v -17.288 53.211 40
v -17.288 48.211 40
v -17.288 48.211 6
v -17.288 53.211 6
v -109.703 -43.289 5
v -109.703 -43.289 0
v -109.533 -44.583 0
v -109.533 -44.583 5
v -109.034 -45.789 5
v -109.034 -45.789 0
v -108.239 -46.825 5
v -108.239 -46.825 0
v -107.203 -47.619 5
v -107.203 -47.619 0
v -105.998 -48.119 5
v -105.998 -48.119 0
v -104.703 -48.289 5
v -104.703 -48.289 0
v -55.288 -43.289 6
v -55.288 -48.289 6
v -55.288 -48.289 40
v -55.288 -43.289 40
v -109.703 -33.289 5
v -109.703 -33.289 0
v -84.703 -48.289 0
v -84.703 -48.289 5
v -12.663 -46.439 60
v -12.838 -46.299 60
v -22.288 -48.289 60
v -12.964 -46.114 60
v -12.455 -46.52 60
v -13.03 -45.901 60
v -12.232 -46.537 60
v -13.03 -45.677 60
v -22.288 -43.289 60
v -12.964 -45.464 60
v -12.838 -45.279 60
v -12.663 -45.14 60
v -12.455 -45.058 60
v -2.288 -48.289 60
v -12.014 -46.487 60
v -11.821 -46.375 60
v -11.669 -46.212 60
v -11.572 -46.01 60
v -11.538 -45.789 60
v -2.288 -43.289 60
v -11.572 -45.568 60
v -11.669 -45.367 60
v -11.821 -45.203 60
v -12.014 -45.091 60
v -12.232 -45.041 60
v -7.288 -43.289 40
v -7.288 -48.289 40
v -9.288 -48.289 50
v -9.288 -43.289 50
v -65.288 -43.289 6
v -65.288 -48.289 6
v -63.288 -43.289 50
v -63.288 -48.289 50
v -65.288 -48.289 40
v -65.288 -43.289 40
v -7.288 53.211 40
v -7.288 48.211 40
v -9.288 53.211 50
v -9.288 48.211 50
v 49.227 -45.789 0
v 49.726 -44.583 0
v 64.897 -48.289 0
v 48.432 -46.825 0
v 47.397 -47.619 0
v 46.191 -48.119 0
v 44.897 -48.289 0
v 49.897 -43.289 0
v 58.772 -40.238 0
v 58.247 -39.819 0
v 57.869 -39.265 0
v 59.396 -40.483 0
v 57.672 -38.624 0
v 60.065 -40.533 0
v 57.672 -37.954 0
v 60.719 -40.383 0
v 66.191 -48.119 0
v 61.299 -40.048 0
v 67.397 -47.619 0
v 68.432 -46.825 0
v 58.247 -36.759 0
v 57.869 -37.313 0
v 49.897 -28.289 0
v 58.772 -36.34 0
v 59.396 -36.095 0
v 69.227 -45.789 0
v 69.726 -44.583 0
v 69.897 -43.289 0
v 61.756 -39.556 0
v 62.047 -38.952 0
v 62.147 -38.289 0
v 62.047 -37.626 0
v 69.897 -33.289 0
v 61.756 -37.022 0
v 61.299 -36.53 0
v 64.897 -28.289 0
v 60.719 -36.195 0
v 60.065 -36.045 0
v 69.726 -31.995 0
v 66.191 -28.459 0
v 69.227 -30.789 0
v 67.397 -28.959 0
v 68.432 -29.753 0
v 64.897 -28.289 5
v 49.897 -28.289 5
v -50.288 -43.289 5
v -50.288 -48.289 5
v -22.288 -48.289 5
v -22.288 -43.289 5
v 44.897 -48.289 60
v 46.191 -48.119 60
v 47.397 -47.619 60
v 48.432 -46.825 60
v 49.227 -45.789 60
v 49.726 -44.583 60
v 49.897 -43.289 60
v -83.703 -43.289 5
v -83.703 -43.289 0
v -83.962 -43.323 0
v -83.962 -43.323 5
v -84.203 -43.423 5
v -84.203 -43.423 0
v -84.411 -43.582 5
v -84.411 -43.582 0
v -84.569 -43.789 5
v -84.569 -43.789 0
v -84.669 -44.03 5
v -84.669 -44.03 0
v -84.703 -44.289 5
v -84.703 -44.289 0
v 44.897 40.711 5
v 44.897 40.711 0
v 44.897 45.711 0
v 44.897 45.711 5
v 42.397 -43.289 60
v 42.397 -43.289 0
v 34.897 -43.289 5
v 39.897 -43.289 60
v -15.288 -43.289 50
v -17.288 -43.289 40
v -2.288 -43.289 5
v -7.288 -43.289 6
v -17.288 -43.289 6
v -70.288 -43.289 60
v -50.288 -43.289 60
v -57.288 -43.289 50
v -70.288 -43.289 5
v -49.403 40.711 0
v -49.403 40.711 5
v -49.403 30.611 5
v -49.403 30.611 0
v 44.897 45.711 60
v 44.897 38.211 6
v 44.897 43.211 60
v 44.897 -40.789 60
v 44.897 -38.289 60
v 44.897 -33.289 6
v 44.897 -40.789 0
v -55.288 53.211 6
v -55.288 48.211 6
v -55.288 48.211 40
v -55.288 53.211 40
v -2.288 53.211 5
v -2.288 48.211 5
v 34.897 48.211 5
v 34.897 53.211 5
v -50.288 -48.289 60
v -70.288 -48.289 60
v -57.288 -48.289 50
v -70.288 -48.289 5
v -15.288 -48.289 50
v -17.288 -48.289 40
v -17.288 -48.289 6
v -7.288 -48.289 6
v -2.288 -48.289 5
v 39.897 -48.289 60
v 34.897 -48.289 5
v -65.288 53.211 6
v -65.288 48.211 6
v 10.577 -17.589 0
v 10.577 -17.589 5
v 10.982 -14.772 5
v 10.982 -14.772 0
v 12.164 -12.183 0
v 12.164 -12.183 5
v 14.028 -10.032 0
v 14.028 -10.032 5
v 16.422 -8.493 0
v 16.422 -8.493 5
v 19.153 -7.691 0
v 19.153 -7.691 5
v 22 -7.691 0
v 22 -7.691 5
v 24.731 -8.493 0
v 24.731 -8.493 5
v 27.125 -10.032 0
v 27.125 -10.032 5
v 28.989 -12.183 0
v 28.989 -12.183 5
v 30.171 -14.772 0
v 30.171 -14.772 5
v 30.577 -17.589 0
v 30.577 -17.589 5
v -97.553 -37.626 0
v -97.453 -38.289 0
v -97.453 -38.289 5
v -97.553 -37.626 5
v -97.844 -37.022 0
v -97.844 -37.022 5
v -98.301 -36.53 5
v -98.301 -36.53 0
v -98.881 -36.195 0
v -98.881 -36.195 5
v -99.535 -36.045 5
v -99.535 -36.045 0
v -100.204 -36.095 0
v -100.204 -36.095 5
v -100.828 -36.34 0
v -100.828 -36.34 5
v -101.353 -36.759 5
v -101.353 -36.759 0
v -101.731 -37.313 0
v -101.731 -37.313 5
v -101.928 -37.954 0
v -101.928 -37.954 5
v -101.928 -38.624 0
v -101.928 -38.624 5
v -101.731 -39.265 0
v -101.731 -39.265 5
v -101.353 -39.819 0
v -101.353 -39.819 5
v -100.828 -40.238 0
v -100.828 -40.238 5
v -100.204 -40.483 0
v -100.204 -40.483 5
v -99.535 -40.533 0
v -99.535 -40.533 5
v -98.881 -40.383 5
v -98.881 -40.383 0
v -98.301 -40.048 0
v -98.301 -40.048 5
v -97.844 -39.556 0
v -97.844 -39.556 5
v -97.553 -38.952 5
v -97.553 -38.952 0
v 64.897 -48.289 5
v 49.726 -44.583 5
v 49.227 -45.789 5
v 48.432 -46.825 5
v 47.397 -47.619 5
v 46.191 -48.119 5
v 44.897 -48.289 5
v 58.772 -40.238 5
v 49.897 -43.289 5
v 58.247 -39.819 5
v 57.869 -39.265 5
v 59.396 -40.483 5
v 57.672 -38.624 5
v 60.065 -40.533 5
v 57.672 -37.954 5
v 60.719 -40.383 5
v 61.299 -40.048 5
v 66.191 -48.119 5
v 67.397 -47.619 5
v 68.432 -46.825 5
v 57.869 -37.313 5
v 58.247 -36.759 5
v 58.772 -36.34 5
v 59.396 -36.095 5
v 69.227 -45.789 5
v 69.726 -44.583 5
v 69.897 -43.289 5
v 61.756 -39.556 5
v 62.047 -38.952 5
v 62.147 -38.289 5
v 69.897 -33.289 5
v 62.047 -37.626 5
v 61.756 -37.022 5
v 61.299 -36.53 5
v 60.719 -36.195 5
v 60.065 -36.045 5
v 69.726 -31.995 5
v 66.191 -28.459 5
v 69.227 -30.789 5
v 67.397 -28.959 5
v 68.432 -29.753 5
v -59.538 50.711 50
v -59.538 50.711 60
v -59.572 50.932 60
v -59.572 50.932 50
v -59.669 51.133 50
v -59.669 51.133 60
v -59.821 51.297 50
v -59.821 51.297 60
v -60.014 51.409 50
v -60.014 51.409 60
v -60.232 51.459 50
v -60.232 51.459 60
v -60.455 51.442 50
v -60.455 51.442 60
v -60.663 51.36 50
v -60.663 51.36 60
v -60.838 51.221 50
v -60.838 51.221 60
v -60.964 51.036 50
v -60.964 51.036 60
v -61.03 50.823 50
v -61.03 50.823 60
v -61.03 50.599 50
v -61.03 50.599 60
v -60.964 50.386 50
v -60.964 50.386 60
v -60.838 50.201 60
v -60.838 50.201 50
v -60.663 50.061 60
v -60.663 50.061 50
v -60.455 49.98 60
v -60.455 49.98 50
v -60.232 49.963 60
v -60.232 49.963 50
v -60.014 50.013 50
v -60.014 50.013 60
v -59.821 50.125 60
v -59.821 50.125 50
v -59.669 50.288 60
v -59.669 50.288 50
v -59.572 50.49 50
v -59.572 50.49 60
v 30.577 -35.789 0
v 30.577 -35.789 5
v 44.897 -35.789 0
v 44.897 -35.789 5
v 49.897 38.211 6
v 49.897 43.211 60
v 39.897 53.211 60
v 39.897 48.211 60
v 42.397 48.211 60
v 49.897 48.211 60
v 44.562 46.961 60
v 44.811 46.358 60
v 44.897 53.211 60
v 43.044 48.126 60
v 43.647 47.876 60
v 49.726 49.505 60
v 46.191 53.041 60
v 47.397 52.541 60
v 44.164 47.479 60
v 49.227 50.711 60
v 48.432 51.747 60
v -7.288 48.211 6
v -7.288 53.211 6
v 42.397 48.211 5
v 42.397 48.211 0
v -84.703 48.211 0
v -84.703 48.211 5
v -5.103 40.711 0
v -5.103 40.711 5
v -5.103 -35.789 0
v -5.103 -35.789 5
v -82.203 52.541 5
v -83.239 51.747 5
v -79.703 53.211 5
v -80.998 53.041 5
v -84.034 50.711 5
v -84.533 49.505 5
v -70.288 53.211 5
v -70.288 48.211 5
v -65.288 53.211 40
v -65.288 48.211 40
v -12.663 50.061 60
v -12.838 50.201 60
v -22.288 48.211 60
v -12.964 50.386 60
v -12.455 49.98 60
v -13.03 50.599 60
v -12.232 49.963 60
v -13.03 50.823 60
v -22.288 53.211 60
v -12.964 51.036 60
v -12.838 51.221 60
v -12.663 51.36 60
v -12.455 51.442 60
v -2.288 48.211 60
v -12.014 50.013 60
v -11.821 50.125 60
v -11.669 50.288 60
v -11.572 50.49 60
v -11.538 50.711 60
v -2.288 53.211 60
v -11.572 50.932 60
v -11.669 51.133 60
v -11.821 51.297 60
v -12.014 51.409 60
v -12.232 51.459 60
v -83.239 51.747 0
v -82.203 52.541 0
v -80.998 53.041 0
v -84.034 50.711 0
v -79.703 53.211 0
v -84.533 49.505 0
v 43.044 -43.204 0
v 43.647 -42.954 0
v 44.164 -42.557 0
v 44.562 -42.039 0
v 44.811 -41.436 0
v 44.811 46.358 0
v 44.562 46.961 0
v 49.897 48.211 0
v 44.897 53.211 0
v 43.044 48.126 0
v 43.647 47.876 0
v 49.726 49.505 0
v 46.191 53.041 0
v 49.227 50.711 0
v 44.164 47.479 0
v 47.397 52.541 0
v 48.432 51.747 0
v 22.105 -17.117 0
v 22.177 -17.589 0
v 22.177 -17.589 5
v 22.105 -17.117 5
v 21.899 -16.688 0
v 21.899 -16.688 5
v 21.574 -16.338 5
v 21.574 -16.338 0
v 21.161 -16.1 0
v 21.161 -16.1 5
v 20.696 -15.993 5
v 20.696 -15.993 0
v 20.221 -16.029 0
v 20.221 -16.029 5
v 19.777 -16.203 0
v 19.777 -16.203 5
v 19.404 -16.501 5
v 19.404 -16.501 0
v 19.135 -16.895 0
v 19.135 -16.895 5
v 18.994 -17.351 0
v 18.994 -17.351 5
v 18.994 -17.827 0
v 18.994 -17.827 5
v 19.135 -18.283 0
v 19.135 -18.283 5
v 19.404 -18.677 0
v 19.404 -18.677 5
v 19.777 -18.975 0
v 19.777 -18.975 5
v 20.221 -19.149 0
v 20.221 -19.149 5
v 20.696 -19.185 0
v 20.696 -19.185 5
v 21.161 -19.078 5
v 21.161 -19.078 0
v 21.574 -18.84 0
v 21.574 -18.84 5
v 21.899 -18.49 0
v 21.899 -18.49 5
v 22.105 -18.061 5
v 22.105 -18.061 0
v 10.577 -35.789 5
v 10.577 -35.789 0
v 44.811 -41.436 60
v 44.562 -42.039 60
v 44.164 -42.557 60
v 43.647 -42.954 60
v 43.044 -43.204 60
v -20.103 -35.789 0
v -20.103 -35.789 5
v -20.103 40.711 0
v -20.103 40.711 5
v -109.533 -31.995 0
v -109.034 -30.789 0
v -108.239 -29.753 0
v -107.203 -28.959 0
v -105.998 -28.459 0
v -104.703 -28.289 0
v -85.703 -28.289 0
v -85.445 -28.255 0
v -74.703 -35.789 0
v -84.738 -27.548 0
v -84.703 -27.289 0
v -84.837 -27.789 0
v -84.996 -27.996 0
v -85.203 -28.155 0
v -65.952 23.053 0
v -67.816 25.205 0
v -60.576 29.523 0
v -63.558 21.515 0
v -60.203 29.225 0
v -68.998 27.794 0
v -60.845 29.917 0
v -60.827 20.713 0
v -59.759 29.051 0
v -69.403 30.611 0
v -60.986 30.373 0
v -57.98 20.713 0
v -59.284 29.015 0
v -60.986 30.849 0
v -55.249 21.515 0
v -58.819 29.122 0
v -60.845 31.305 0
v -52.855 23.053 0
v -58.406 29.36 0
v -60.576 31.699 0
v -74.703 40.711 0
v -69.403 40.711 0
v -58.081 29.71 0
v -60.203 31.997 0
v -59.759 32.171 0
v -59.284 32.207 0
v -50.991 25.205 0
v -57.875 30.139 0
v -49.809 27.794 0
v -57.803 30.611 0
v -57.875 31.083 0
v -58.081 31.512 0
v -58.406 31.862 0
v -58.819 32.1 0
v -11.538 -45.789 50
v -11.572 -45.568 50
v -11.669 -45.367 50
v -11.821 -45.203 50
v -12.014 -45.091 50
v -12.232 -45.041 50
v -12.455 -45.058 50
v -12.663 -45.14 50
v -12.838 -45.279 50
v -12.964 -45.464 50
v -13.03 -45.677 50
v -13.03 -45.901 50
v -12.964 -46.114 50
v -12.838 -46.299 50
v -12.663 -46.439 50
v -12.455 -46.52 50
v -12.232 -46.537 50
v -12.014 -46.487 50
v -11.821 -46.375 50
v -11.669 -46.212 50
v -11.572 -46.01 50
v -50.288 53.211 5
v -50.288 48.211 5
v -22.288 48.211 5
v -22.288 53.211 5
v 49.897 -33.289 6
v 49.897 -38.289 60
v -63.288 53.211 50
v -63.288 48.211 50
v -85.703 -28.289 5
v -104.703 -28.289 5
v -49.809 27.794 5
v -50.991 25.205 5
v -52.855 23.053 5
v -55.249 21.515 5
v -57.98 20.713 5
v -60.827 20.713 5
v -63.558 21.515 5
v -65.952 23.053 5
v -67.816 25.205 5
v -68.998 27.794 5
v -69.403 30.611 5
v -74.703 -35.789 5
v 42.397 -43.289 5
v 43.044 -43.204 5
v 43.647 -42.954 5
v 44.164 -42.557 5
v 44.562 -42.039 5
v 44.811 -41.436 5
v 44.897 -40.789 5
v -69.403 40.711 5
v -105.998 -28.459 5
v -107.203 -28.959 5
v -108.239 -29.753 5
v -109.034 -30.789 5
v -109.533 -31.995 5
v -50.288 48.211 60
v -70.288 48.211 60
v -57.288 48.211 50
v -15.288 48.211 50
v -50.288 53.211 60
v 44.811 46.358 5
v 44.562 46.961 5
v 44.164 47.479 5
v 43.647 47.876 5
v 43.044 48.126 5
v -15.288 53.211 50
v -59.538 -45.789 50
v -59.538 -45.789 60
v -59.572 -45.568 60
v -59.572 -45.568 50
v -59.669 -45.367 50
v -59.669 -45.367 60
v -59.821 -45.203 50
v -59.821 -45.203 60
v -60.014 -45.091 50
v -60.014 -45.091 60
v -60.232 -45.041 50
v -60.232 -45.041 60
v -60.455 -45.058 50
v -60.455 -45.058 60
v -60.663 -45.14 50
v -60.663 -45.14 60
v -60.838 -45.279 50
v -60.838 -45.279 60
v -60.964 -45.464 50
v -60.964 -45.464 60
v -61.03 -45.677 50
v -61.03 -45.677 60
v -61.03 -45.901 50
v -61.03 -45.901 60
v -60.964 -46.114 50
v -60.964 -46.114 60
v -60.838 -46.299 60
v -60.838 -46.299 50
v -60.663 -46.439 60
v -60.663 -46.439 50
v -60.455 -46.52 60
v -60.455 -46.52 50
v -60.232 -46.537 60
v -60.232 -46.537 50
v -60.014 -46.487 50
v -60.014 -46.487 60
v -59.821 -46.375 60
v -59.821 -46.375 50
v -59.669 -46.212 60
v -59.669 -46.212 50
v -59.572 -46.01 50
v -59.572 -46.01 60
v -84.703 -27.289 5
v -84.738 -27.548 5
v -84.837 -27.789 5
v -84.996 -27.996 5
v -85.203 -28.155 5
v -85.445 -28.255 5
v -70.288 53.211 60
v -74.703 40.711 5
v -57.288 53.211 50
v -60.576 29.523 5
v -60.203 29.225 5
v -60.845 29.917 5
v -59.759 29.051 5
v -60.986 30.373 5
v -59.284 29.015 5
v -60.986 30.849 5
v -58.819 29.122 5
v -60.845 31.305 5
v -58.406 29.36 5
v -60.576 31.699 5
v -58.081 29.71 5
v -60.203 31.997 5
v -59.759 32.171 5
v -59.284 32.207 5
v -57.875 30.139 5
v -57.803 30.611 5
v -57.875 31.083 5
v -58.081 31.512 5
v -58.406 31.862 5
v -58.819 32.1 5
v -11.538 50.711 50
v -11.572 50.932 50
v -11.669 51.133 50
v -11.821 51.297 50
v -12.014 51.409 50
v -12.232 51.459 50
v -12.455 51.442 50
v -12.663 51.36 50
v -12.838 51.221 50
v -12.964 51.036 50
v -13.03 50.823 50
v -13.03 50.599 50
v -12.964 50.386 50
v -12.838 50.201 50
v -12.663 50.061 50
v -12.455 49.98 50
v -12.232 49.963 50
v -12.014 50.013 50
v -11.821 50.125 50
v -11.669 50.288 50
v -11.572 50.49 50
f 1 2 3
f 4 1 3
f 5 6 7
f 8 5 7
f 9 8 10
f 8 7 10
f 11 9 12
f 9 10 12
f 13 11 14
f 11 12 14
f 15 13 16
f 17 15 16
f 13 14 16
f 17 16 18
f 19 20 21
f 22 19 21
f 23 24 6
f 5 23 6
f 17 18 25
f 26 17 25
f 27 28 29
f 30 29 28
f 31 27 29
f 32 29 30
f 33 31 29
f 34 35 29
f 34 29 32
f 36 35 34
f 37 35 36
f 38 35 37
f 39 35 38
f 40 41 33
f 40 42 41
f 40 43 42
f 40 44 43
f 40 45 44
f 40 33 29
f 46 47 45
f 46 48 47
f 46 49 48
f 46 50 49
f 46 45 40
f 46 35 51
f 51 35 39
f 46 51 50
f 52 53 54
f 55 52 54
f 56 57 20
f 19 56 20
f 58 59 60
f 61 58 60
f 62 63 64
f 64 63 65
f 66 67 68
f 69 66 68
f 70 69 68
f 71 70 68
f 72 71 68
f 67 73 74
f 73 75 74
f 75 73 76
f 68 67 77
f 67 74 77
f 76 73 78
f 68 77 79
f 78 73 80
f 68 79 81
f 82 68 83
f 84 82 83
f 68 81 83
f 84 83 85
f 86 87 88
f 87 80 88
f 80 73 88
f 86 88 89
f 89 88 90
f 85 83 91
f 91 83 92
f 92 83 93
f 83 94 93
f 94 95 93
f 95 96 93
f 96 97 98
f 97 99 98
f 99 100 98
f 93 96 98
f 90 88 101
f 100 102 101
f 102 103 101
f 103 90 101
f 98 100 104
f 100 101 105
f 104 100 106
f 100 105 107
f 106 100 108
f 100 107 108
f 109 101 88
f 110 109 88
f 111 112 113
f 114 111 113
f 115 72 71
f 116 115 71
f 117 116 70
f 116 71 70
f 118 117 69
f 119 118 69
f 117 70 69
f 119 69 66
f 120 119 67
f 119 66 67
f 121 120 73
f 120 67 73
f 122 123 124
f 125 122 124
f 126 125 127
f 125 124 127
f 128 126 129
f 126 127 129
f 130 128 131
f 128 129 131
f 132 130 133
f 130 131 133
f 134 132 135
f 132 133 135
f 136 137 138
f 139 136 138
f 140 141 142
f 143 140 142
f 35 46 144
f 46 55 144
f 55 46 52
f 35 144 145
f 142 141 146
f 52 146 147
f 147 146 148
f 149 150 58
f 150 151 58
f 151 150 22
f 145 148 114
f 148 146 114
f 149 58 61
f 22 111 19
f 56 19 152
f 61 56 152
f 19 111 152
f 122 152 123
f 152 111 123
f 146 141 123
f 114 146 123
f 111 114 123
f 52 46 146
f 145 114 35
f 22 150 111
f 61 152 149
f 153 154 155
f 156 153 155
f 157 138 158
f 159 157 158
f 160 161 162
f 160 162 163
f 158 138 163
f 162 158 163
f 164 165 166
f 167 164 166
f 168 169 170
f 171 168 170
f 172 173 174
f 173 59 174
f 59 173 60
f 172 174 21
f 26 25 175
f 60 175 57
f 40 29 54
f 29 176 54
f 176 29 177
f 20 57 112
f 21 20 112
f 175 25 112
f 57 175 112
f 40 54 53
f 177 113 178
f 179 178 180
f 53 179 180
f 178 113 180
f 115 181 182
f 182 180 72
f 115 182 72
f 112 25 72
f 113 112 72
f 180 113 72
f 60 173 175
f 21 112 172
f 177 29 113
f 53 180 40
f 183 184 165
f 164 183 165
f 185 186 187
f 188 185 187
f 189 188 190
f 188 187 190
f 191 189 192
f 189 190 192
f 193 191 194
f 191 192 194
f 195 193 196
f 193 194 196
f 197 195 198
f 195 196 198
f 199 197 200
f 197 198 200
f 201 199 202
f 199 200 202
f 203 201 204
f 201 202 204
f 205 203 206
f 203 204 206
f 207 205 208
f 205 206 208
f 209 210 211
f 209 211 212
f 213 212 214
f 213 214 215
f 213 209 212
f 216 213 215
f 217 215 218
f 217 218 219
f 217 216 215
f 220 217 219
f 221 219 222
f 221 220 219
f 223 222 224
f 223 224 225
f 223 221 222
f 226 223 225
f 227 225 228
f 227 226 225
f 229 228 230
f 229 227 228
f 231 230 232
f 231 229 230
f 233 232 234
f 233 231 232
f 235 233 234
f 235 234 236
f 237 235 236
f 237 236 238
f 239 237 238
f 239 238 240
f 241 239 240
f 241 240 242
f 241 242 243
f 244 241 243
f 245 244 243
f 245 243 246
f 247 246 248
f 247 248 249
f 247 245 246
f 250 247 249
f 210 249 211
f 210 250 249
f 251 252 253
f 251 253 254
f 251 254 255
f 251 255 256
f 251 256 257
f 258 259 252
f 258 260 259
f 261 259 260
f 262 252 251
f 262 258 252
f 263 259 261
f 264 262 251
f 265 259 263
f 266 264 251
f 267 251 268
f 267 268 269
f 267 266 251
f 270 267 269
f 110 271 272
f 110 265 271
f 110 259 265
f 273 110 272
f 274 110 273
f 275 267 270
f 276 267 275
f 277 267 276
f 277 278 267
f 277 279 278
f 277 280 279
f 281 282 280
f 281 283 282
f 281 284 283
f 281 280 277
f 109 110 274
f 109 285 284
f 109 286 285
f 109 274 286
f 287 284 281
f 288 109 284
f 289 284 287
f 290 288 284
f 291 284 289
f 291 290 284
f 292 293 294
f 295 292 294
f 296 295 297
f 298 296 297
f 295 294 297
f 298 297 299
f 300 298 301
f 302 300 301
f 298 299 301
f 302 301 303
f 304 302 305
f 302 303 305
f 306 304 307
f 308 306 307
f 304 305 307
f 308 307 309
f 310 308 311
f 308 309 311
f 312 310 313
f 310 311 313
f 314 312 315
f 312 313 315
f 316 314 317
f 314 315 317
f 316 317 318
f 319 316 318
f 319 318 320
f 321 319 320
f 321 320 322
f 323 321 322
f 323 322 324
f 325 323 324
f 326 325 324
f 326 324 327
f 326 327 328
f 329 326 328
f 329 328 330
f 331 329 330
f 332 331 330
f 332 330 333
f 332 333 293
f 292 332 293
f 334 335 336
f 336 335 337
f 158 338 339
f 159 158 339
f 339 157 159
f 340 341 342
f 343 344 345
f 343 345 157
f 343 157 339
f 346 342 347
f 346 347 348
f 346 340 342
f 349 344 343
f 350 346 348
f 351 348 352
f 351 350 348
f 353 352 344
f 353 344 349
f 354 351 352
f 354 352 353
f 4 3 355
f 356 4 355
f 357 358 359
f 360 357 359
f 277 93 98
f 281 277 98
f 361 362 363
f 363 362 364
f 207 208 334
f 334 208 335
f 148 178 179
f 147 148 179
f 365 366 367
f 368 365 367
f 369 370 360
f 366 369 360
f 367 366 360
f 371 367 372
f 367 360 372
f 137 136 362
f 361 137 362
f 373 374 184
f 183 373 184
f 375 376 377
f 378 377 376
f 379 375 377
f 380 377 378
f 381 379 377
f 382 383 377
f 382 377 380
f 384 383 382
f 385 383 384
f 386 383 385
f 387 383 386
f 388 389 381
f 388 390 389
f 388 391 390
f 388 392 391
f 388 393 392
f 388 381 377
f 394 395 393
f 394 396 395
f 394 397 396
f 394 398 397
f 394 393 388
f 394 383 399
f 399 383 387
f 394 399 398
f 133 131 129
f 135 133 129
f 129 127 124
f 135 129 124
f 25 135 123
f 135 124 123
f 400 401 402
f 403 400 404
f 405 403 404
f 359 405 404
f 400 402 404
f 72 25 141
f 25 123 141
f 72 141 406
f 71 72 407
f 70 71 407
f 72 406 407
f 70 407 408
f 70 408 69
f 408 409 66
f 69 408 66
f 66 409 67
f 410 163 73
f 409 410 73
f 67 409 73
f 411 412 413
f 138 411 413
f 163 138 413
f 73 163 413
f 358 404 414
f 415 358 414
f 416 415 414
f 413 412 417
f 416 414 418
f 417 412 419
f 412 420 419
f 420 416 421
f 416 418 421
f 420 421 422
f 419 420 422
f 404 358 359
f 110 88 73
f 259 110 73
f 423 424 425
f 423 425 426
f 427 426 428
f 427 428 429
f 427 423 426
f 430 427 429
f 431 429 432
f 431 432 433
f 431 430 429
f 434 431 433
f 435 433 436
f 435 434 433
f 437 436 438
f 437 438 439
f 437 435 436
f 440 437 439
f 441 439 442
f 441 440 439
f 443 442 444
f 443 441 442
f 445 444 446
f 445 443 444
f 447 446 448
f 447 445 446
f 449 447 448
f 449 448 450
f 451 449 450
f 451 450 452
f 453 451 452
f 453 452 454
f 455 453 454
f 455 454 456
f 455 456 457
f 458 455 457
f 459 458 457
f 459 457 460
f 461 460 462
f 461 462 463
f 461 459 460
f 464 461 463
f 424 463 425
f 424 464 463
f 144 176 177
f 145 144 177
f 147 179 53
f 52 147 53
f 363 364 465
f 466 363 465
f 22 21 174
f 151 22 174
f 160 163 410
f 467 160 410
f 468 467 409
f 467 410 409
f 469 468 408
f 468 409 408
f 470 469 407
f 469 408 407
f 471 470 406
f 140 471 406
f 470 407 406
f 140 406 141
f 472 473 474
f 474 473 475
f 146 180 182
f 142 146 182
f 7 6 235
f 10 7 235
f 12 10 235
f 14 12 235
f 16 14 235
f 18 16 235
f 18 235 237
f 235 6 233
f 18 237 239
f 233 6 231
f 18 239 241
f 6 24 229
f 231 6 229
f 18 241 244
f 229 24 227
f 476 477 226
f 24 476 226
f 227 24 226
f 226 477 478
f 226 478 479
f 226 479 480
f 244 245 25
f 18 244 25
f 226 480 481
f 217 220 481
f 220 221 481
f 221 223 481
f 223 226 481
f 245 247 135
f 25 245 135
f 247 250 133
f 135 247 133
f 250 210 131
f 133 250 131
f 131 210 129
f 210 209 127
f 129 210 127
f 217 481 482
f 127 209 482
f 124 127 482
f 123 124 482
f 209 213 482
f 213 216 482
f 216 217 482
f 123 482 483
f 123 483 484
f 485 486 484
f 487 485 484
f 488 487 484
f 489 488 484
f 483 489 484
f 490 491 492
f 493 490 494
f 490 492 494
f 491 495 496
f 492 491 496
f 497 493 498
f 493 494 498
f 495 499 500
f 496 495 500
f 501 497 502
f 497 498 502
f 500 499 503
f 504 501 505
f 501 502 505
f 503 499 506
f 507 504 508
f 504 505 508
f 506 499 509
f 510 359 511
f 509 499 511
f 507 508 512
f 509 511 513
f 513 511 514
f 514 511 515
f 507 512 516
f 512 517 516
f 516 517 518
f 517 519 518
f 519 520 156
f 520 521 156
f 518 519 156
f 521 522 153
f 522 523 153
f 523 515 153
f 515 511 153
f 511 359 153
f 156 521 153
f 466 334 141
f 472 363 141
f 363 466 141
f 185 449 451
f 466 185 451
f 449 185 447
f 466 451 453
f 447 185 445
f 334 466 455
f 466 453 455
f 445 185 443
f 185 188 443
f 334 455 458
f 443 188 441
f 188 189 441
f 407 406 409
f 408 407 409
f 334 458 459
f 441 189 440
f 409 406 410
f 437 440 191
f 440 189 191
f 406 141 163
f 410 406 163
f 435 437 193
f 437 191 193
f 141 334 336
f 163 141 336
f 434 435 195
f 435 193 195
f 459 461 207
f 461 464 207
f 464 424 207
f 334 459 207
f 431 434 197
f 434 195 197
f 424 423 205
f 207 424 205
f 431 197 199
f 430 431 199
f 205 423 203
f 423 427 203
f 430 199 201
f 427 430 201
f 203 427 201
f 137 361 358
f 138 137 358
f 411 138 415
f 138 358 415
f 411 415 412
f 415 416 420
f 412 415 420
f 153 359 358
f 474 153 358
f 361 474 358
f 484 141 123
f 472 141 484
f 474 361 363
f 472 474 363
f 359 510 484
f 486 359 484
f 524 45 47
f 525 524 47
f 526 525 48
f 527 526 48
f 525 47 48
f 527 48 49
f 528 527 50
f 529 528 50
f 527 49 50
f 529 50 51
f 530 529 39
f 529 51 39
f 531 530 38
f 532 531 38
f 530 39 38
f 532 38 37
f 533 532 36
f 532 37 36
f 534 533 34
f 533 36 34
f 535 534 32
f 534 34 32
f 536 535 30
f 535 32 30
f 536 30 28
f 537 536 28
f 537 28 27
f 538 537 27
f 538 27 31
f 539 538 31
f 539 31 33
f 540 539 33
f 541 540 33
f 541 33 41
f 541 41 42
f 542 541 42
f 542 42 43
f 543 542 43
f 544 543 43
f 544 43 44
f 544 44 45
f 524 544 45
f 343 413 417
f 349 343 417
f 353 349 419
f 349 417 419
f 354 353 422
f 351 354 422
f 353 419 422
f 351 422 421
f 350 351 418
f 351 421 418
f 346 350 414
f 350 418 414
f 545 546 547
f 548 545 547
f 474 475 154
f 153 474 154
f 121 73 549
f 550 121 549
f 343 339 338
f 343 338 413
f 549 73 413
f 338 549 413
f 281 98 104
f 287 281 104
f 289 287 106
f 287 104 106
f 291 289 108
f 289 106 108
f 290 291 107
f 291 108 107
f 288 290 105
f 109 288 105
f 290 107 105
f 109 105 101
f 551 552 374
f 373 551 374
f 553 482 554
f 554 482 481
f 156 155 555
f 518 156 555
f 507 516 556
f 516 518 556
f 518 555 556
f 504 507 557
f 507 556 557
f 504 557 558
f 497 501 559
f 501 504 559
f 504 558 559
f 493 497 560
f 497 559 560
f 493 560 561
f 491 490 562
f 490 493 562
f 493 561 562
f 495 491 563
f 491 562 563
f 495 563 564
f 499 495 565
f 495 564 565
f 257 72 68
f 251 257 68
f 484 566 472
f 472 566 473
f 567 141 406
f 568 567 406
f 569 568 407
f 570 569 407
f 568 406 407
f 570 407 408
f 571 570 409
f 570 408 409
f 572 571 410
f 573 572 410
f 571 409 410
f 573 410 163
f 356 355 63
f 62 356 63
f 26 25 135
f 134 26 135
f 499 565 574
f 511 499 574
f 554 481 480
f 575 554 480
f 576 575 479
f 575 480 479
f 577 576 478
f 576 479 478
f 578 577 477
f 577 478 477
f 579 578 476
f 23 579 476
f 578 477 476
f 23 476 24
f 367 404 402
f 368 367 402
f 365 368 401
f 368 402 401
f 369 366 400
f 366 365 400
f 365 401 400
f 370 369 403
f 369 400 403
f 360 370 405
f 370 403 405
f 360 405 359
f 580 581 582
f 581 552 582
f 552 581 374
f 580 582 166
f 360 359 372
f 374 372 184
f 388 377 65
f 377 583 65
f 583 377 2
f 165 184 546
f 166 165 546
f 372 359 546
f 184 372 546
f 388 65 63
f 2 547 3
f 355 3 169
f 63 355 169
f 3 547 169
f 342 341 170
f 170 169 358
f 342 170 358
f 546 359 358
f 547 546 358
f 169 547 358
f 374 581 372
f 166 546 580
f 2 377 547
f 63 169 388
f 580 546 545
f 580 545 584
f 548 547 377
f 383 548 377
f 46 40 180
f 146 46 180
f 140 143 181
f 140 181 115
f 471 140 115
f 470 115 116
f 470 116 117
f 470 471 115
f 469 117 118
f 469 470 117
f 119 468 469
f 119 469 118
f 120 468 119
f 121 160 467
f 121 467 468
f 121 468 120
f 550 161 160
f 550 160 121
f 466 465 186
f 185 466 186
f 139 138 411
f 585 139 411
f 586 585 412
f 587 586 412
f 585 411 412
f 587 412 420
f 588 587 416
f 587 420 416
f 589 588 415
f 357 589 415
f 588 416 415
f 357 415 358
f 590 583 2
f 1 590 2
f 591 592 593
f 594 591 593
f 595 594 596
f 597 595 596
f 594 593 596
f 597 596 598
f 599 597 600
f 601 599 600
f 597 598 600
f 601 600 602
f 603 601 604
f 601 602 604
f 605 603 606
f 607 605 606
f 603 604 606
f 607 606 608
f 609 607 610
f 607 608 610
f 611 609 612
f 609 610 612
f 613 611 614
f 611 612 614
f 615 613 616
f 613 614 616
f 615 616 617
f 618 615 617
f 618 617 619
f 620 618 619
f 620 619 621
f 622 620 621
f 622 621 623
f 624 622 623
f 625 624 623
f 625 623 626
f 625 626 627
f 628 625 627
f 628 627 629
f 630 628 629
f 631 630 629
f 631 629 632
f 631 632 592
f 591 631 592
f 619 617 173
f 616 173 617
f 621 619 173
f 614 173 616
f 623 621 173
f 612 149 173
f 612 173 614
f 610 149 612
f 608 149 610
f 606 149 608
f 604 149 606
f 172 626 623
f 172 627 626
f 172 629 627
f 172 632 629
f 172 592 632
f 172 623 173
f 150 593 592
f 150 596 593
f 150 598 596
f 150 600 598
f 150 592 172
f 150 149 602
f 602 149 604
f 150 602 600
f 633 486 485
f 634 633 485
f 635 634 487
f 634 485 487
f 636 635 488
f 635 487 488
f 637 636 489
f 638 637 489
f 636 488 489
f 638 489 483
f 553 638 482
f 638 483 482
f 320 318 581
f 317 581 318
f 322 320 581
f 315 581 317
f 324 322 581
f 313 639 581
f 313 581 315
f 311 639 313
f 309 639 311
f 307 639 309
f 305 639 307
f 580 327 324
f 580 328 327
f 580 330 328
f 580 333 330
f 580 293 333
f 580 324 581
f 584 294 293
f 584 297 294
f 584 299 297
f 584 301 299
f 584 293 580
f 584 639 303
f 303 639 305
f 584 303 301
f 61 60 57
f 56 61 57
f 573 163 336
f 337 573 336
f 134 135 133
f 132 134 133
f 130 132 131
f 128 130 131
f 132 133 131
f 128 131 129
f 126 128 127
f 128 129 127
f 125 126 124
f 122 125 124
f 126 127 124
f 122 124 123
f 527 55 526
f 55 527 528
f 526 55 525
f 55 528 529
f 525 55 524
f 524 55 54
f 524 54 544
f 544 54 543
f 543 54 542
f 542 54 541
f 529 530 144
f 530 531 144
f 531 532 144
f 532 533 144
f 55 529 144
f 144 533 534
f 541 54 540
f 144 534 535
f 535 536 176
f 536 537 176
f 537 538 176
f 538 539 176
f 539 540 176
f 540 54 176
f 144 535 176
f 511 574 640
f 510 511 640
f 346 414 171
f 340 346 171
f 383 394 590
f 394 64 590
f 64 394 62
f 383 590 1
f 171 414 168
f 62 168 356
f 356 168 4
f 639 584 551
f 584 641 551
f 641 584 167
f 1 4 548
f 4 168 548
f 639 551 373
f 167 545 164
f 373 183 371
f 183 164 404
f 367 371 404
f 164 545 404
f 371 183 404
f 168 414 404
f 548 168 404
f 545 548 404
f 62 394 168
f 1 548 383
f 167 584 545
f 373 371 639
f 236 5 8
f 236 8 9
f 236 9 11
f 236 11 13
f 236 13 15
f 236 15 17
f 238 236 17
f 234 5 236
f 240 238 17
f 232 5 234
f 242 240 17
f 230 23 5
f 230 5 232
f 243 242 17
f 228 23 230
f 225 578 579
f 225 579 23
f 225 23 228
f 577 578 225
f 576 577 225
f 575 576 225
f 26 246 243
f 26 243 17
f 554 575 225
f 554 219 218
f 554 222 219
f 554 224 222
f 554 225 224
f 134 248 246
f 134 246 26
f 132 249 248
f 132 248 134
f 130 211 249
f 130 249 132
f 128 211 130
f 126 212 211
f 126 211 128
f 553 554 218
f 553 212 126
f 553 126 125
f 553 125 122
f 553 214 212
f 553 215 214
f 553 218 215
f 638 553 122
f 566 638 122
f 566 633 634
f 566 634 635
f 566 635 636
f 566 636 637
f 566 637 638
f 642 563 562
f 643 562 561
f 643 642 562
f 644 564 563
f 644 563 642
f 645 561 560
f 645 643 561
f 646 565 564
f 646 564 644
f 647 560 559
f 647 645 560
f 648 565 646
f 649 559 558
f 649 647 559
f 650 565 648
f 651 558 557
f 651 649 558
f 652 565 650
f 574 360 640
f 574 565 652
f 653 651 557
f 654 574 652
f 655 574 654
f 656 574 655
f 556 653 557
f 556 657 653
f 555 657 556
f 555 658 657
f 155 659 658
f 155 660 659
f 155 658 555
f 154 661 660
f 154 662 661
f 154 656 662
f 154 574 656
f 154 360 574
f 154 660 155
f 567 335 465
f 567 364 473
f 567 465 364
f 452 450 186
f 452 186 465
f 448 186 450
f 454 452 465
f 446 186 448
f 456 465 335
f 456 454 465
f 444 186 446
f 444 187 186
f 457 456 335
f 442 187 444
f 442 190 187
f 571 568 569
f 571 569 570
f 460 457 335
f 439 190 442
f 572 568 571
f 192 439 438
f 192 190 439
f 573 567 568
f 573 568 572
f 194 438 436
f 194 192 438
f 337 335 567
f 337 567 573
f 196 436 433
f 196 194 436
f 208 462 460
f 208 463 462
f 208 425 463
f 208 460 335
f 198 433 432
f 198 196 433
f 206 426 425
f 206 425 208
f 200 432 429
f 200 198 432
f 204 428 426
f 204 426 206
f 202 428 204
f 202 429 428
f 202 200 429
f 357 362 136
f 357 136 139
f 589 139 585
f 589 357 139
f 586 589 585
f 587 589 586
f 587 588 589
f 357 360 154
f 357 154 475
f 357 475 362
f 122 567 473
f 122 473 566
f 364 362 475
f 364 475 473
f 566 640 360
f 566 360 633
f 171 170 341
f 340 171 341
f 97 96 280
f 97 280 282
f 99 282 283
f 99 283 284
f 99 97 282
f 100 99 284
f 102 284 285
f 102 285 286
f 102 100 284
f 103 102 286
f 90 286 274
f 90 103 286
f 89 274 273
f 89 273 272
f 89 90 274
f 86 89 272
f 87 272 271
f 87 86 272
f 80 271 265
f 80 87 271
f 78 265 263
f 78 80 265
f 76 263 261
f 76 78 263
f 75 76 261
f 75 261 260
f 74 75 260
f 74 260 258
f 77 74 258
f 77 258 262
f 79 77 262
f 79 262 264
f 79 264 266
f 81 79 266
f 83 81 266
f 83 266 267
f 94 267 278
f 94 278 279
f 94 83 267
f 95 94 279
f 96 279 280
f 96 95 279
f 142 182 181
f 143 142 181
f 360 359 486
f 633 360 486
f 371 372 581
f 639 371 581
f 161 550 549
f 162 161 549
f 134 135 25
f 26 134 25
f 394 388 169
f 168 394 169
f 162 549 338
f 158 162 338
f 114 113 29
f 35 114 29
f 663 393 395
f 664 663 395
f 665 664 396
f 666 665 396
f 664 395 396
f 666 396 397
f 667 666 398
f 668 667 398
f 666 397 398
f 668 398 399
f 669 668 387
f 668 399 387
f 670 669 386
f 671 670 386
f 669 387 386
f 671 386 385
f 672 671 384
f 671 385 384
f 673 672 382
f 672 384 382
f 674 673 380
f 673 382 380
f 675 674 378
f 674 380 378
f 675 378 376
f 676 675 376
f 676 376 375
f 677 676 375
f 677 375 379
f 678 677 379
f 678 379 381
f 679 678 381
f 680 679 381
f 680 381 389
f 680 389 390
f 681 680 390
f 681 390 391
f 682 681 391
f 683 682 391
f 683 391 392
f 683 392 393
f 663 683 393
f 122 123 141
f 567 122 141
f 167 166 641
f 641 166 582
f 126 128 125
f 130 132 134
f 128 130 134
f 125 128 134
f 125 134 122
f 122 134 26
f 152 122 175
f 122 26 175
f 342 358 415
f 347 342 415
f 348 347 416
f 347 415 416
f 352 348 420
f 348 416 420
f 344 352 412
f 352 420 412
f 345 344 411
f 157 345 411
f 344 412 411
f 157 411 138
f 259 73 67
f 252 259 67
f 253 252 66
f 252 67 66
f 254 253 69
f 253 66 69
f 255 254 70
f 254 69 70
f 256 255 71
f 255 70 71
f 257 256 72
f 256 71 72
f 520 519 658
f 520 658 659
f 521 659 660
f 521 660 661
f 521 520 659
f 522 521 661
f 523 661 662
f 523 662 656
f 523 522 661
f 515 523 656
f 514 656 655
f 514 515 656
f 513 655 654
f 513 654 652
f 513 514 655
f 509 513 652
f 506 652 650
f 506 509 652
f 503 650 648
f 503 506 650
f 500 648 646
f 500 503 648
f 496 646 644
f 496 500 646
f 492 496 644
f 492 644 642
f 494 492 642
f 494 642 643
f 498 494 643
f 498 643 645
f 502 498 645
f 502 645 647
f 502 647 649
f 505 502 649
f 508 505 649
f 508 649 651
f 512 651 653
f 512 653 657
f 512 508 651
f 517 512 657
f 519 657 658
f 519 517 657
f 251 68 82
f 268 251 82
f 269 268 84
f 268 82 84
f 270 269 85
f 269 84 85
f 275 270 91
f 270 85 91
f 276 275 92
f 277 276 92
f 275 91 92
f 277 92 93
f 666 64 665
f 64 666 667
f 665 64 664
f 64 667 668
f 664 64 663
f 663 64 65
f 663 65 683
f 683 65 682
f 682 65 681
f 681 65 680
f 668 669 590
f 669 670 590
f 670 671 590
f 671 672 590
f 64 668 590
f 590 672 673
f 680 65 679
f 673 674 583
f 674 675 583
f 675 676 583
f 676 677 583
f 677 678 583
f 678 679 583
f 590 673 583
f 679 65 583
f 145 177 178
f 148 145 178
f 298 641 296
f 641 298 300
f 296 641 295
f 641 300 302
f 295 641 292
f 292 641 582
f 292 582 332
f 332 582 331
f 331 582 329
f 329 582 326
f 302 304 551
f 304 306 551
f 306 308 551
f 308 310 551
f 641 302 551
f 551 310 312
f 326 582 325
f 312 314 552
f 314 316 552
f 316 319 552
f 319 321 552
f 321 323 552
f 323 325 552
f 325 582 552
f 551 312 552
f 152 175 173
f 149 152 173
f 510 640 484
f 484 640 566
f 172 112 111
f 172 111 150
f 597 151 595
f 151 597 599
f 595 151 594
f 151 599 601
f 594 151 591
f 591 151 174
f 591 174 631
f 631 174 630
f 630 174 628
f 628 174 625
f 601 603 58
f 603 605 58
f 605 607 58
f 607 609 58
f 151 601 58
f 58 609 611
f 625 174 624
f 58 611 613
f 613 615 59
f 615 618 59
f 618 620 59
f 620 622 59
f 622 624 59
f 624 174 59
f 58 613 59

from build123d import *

# Parameters (mm, degrees)
F0_R      = 2.25
F0_R_2    = 1.6
F1_DEPTH  = 5
F2_DEPTH  = 60
F3_R      = 0.75
F4_DEPTH  = 20
F6_DEPTH  = 25
F9_W      = 28
F9_H      = 55
F10_DEPTH = 200
F12_DEPTH = 200
F13_DEPTH = 200
F15_DEPTH = 100
F9_W_2    = 14.415
F16_DEPTH = 222


with BuildPart() as f1:
    # F0 (on Top) → F1 (new body)
    with BuildSketch(Plane.XY):
        with BuildLine():
            Line((42.396549, 48.210974), (-84.703451, 48.210974))
            Line((-84.703451, 48.210974), (-84.703451, -27.289026))
            ThreePointArc((-84.703451, -27.289026), (-84.996345, -27.996132), (-85.703451, -28.289026))
            Line((-85.703451, -28.289026), (-104.703451, -28.289026))
            ThreePointArc((-104.703451, -28.289026), (-108.238985, -29.753492), (-109.703451, -33.289026))
            Line((-109.703451, -33.289026), (-109.703451, -43.289026))
            ThreePointArc((-109.703451, -43.289026), (-108.238985, -46.82456), (-104.703451, -48.289026))
            Line((-104.703451, -48.289026), (-84.703451, -48.289026))
            Line((-84.703451, -48.289026), (-84.703451, -44.289026))
            ThreePointArc((-84.703451, -44.289026), (-84.410558, -43.581919), (-83.703451, -43.289026))
            Line((-83.703451, -43.289026), (42.396549, -43.289026))
            ThreePointArc((42.396549, -43.289026), (44.164316, -42.556793), (44.896549, -40.789026))
            Line((44.896549, -40.789026), (44.896549, 45.710974))
            ThreePointArc((44.896549, 45.710974), (44.164316, 47.478741), (42.396549, 48.210974))
        make_face()
        with Locations((-99.703451, -38.289026)):
            Circle(F0_R, mode=Mode.SUBTRACT)
        with Locations((20.576549, -17.589026)):
            Circle(F0_R_2, mode=Mode.SUBTRACT)
        with Locations((-59.403451, 30.610974)):
            Circle(F0_R_2, mode=Mode.SUBTRACT)
        with BuildLine():
            Line((64.896549, -28.289026), (49.896549, -28.289026))
            Line((49.896549, -28.289026), (49.896549, -43.289026))
            ThreePointArc((49.896549, -43.289026), (48.432083, -46.82456), (44.896549, -48.289026))
            Line((44.896549, -48.289026), (64.896549, -48.289026))
            ThreePointArc((64.896549, -48.289026), (68.432083, -46.82456), (69.896549, -43.289026))
            Line((69.896549, -43.289026), (69.896549, -33.289026))
            ThreePointArc((69.896549, -33.289026), (68.432083, -29.753492), (64.896549, -28.289026))
        make_face()
        with Locations((59.896549, -38.289026)):
            Circle(F0_R, mode=Mode.SUBTRACT)
    extrude(amount=F1_DEPTH)

    # F14 (on face) → F15 (cut)
    with BuildSketch(Plane.XY.offset(5)):
        with BuildLine():
            ThreePointArc((-49.403451, 30.610974), (-59.403451, 20.610974), (-69.403451, 30.610974))
            Line((-69.403451, 30.610974), (-69.403451, 40.710974))
            Line((-69.403451, 40.710974), (-74.703451, 40.710974))
            Line((-74.703451, 40.710974), (-74.703451, -35.789026))
            Line((-74.703451, -35.789026), (-20.103451, -35.789026))
            Line((-20.103451, -35.789026), (-20.103451, 40.710974))
            Line((-20.103451, 40.710974), (-49.403451, 40.710974))
            Line((-49.403451, 40.710974), (-49.403451, 30.610974))
        make_face()
        with BuildLine():
            Line((44.896549, 40.710974), (-5.103451, 40.710974))
            Line((-5.103451, 40.710974), (-5.103451, -35.789026))
            Line((-5.103451, -35.789026), (10.576549, -35.789026))
            Line((10.576549, -35.789026), (10.576549, -17.589026))
            ThreePointArc((10.576549, -17.589026), (20.576549, -7.589026), (30.576549, -17.589026))
            Line((30.576549, -17.589026), (30.576549, -35.789026))
            Line((30.576549, -35.789026), (44.896549, -35.789026))
            Line((44.896549, -35.789026), (44.896549, 40.710974))
        make_face()
    extrude(amount=-F15_DEPTH, mode=Mode.SUBTRACT)


with BuildPart() as f2:
    # F0 (on Top) → F2 (new body)
    with BuildSketch(Plane.XY):
        with BuildLine():
            Line((44.896549, 53.210974), (-79.703451, 53.210974))
            ThreePointArc((-79.703451, 53.210974), (-83.238985, 51.746508), (-84.703451, 48.210974))
            Line((-84.703451, 48.210974), (42.396549, 48.210974))
            ThreePointArc((42.396549, 48.210974), (44.164316, 47.478741), (44.896549, 45.710974))
            Line((44.896549, 45.710974), (44.896549, -40.789026))
            ThreePointArc((44.896549, -40.789026), (44.164316, -42.556793), (42.396549, -43.289026))
            Line((42.396549, -43.289026), (-83.703451, -43.289026))
            ThreePointArc((-83.703451, -43.289026), (-84.410558, -43.581919), (-84.703451, -44.289026))
            Line((-84.703451, -44.289026), (-84.703451, -48.289026))
            Line((-84.703451, -48.289026), (44.896549, -48.289026))
            ThreePointArc((44.896549, -48.289026), (48.432083, -46.82456), (49.896549, -43.289026))
            Line((49.896549, -43.289026), (49.896549, -28.289026))
            Line((49.896549, -28.289026), (49.896549, 48.210974))
            ThreePointArc((49.896549, 48.210974), (48.432083, 51.746508), (44.896549, 53.210974))
        make_face()
    extrude(amount=F2_DEPTH)

    # F3 (on face) → F4 (cut)
    with BuildSketch(Plane.XY.offset(60)):
        with Locations((-12.288451, 50.710974)):
            Circle(F3_R)
        with Locations((-60.288451, 50.710974)):
            Circle(F3_R)
        with Locations((-60.288451, -45.789026)):
            Circle(F3_R)
        with Locations((-12.288451, -45.789026)):
            Circle(F3_R)
    extrude(amount=-F4_DEPTH, mode=Mode.SUBTRACT)

    # F5 (on face) → F6 (cut)
    with BuildSketch(Plane.YZ.offset(49.896549)):
        Polygon((43.210974, 60), (-38.289026, 60), (-33.289026, 6), (38.210974, 6), align=None)
    extrude(amount=-F6_DEPTH, mode=Mode.SUBTRACT)

    # F9 (on face) → F10 (cut)
    with BuildSketch(Plane.XZ.offset(48.289026)):
        with Locations((-36.288451, 32.5)):
            Rectangle(F9_W, F9_H)
        Polygon((-2.288451, 5), (34.896549, 5), (39.896549, 60), (-2.288451, 60), align=None)
    extrude(amount=-F10_DEPTH, mode=Mode.SUBTRACT)

    # F11 (on face) → F12 (cut)
    with BuildSketch(Plane.XZ.offset(48.289026)):
        Polygon((-84.703451, 60), (-84.703451, 5), (-70.288451, 60), align=None)
    extrude(amount=-F12_DEPTH, mode=Mode.SUBTRACT)

    # F9 (on face) → F13 (cut)
    with BuildSketch(Plane.XZ.offset(48.289026)):
        Polygon((-57.288451, 50), (-63.288451, 50), (-65.288451, 40), (-65.288451, 6), (-55.288451, 6), (-55.288451, 40), align=None)
        Polygon((-17.288451, 40), (-17.288451, 6), (-7.288451, 6), (-7.288451, 40), (-9.288451, 50), (-15.288451, 50), align=None)
    extrude(amount=-F13_DEPTH, mode=Mode.SUBTRACT)

    # F9 (on face) → F16 (cut)
    with BuildSketch(Plane.XZ.offset(48.289026)):
        with Locations((-77.495951, 32.5)):
            Rectangle(F9_W_2, F9_H)
    extrude(amount=-F16_DEPTH, mode=Mode.SUBTRACT)


solid = Compound([f1.part, f2.part])
